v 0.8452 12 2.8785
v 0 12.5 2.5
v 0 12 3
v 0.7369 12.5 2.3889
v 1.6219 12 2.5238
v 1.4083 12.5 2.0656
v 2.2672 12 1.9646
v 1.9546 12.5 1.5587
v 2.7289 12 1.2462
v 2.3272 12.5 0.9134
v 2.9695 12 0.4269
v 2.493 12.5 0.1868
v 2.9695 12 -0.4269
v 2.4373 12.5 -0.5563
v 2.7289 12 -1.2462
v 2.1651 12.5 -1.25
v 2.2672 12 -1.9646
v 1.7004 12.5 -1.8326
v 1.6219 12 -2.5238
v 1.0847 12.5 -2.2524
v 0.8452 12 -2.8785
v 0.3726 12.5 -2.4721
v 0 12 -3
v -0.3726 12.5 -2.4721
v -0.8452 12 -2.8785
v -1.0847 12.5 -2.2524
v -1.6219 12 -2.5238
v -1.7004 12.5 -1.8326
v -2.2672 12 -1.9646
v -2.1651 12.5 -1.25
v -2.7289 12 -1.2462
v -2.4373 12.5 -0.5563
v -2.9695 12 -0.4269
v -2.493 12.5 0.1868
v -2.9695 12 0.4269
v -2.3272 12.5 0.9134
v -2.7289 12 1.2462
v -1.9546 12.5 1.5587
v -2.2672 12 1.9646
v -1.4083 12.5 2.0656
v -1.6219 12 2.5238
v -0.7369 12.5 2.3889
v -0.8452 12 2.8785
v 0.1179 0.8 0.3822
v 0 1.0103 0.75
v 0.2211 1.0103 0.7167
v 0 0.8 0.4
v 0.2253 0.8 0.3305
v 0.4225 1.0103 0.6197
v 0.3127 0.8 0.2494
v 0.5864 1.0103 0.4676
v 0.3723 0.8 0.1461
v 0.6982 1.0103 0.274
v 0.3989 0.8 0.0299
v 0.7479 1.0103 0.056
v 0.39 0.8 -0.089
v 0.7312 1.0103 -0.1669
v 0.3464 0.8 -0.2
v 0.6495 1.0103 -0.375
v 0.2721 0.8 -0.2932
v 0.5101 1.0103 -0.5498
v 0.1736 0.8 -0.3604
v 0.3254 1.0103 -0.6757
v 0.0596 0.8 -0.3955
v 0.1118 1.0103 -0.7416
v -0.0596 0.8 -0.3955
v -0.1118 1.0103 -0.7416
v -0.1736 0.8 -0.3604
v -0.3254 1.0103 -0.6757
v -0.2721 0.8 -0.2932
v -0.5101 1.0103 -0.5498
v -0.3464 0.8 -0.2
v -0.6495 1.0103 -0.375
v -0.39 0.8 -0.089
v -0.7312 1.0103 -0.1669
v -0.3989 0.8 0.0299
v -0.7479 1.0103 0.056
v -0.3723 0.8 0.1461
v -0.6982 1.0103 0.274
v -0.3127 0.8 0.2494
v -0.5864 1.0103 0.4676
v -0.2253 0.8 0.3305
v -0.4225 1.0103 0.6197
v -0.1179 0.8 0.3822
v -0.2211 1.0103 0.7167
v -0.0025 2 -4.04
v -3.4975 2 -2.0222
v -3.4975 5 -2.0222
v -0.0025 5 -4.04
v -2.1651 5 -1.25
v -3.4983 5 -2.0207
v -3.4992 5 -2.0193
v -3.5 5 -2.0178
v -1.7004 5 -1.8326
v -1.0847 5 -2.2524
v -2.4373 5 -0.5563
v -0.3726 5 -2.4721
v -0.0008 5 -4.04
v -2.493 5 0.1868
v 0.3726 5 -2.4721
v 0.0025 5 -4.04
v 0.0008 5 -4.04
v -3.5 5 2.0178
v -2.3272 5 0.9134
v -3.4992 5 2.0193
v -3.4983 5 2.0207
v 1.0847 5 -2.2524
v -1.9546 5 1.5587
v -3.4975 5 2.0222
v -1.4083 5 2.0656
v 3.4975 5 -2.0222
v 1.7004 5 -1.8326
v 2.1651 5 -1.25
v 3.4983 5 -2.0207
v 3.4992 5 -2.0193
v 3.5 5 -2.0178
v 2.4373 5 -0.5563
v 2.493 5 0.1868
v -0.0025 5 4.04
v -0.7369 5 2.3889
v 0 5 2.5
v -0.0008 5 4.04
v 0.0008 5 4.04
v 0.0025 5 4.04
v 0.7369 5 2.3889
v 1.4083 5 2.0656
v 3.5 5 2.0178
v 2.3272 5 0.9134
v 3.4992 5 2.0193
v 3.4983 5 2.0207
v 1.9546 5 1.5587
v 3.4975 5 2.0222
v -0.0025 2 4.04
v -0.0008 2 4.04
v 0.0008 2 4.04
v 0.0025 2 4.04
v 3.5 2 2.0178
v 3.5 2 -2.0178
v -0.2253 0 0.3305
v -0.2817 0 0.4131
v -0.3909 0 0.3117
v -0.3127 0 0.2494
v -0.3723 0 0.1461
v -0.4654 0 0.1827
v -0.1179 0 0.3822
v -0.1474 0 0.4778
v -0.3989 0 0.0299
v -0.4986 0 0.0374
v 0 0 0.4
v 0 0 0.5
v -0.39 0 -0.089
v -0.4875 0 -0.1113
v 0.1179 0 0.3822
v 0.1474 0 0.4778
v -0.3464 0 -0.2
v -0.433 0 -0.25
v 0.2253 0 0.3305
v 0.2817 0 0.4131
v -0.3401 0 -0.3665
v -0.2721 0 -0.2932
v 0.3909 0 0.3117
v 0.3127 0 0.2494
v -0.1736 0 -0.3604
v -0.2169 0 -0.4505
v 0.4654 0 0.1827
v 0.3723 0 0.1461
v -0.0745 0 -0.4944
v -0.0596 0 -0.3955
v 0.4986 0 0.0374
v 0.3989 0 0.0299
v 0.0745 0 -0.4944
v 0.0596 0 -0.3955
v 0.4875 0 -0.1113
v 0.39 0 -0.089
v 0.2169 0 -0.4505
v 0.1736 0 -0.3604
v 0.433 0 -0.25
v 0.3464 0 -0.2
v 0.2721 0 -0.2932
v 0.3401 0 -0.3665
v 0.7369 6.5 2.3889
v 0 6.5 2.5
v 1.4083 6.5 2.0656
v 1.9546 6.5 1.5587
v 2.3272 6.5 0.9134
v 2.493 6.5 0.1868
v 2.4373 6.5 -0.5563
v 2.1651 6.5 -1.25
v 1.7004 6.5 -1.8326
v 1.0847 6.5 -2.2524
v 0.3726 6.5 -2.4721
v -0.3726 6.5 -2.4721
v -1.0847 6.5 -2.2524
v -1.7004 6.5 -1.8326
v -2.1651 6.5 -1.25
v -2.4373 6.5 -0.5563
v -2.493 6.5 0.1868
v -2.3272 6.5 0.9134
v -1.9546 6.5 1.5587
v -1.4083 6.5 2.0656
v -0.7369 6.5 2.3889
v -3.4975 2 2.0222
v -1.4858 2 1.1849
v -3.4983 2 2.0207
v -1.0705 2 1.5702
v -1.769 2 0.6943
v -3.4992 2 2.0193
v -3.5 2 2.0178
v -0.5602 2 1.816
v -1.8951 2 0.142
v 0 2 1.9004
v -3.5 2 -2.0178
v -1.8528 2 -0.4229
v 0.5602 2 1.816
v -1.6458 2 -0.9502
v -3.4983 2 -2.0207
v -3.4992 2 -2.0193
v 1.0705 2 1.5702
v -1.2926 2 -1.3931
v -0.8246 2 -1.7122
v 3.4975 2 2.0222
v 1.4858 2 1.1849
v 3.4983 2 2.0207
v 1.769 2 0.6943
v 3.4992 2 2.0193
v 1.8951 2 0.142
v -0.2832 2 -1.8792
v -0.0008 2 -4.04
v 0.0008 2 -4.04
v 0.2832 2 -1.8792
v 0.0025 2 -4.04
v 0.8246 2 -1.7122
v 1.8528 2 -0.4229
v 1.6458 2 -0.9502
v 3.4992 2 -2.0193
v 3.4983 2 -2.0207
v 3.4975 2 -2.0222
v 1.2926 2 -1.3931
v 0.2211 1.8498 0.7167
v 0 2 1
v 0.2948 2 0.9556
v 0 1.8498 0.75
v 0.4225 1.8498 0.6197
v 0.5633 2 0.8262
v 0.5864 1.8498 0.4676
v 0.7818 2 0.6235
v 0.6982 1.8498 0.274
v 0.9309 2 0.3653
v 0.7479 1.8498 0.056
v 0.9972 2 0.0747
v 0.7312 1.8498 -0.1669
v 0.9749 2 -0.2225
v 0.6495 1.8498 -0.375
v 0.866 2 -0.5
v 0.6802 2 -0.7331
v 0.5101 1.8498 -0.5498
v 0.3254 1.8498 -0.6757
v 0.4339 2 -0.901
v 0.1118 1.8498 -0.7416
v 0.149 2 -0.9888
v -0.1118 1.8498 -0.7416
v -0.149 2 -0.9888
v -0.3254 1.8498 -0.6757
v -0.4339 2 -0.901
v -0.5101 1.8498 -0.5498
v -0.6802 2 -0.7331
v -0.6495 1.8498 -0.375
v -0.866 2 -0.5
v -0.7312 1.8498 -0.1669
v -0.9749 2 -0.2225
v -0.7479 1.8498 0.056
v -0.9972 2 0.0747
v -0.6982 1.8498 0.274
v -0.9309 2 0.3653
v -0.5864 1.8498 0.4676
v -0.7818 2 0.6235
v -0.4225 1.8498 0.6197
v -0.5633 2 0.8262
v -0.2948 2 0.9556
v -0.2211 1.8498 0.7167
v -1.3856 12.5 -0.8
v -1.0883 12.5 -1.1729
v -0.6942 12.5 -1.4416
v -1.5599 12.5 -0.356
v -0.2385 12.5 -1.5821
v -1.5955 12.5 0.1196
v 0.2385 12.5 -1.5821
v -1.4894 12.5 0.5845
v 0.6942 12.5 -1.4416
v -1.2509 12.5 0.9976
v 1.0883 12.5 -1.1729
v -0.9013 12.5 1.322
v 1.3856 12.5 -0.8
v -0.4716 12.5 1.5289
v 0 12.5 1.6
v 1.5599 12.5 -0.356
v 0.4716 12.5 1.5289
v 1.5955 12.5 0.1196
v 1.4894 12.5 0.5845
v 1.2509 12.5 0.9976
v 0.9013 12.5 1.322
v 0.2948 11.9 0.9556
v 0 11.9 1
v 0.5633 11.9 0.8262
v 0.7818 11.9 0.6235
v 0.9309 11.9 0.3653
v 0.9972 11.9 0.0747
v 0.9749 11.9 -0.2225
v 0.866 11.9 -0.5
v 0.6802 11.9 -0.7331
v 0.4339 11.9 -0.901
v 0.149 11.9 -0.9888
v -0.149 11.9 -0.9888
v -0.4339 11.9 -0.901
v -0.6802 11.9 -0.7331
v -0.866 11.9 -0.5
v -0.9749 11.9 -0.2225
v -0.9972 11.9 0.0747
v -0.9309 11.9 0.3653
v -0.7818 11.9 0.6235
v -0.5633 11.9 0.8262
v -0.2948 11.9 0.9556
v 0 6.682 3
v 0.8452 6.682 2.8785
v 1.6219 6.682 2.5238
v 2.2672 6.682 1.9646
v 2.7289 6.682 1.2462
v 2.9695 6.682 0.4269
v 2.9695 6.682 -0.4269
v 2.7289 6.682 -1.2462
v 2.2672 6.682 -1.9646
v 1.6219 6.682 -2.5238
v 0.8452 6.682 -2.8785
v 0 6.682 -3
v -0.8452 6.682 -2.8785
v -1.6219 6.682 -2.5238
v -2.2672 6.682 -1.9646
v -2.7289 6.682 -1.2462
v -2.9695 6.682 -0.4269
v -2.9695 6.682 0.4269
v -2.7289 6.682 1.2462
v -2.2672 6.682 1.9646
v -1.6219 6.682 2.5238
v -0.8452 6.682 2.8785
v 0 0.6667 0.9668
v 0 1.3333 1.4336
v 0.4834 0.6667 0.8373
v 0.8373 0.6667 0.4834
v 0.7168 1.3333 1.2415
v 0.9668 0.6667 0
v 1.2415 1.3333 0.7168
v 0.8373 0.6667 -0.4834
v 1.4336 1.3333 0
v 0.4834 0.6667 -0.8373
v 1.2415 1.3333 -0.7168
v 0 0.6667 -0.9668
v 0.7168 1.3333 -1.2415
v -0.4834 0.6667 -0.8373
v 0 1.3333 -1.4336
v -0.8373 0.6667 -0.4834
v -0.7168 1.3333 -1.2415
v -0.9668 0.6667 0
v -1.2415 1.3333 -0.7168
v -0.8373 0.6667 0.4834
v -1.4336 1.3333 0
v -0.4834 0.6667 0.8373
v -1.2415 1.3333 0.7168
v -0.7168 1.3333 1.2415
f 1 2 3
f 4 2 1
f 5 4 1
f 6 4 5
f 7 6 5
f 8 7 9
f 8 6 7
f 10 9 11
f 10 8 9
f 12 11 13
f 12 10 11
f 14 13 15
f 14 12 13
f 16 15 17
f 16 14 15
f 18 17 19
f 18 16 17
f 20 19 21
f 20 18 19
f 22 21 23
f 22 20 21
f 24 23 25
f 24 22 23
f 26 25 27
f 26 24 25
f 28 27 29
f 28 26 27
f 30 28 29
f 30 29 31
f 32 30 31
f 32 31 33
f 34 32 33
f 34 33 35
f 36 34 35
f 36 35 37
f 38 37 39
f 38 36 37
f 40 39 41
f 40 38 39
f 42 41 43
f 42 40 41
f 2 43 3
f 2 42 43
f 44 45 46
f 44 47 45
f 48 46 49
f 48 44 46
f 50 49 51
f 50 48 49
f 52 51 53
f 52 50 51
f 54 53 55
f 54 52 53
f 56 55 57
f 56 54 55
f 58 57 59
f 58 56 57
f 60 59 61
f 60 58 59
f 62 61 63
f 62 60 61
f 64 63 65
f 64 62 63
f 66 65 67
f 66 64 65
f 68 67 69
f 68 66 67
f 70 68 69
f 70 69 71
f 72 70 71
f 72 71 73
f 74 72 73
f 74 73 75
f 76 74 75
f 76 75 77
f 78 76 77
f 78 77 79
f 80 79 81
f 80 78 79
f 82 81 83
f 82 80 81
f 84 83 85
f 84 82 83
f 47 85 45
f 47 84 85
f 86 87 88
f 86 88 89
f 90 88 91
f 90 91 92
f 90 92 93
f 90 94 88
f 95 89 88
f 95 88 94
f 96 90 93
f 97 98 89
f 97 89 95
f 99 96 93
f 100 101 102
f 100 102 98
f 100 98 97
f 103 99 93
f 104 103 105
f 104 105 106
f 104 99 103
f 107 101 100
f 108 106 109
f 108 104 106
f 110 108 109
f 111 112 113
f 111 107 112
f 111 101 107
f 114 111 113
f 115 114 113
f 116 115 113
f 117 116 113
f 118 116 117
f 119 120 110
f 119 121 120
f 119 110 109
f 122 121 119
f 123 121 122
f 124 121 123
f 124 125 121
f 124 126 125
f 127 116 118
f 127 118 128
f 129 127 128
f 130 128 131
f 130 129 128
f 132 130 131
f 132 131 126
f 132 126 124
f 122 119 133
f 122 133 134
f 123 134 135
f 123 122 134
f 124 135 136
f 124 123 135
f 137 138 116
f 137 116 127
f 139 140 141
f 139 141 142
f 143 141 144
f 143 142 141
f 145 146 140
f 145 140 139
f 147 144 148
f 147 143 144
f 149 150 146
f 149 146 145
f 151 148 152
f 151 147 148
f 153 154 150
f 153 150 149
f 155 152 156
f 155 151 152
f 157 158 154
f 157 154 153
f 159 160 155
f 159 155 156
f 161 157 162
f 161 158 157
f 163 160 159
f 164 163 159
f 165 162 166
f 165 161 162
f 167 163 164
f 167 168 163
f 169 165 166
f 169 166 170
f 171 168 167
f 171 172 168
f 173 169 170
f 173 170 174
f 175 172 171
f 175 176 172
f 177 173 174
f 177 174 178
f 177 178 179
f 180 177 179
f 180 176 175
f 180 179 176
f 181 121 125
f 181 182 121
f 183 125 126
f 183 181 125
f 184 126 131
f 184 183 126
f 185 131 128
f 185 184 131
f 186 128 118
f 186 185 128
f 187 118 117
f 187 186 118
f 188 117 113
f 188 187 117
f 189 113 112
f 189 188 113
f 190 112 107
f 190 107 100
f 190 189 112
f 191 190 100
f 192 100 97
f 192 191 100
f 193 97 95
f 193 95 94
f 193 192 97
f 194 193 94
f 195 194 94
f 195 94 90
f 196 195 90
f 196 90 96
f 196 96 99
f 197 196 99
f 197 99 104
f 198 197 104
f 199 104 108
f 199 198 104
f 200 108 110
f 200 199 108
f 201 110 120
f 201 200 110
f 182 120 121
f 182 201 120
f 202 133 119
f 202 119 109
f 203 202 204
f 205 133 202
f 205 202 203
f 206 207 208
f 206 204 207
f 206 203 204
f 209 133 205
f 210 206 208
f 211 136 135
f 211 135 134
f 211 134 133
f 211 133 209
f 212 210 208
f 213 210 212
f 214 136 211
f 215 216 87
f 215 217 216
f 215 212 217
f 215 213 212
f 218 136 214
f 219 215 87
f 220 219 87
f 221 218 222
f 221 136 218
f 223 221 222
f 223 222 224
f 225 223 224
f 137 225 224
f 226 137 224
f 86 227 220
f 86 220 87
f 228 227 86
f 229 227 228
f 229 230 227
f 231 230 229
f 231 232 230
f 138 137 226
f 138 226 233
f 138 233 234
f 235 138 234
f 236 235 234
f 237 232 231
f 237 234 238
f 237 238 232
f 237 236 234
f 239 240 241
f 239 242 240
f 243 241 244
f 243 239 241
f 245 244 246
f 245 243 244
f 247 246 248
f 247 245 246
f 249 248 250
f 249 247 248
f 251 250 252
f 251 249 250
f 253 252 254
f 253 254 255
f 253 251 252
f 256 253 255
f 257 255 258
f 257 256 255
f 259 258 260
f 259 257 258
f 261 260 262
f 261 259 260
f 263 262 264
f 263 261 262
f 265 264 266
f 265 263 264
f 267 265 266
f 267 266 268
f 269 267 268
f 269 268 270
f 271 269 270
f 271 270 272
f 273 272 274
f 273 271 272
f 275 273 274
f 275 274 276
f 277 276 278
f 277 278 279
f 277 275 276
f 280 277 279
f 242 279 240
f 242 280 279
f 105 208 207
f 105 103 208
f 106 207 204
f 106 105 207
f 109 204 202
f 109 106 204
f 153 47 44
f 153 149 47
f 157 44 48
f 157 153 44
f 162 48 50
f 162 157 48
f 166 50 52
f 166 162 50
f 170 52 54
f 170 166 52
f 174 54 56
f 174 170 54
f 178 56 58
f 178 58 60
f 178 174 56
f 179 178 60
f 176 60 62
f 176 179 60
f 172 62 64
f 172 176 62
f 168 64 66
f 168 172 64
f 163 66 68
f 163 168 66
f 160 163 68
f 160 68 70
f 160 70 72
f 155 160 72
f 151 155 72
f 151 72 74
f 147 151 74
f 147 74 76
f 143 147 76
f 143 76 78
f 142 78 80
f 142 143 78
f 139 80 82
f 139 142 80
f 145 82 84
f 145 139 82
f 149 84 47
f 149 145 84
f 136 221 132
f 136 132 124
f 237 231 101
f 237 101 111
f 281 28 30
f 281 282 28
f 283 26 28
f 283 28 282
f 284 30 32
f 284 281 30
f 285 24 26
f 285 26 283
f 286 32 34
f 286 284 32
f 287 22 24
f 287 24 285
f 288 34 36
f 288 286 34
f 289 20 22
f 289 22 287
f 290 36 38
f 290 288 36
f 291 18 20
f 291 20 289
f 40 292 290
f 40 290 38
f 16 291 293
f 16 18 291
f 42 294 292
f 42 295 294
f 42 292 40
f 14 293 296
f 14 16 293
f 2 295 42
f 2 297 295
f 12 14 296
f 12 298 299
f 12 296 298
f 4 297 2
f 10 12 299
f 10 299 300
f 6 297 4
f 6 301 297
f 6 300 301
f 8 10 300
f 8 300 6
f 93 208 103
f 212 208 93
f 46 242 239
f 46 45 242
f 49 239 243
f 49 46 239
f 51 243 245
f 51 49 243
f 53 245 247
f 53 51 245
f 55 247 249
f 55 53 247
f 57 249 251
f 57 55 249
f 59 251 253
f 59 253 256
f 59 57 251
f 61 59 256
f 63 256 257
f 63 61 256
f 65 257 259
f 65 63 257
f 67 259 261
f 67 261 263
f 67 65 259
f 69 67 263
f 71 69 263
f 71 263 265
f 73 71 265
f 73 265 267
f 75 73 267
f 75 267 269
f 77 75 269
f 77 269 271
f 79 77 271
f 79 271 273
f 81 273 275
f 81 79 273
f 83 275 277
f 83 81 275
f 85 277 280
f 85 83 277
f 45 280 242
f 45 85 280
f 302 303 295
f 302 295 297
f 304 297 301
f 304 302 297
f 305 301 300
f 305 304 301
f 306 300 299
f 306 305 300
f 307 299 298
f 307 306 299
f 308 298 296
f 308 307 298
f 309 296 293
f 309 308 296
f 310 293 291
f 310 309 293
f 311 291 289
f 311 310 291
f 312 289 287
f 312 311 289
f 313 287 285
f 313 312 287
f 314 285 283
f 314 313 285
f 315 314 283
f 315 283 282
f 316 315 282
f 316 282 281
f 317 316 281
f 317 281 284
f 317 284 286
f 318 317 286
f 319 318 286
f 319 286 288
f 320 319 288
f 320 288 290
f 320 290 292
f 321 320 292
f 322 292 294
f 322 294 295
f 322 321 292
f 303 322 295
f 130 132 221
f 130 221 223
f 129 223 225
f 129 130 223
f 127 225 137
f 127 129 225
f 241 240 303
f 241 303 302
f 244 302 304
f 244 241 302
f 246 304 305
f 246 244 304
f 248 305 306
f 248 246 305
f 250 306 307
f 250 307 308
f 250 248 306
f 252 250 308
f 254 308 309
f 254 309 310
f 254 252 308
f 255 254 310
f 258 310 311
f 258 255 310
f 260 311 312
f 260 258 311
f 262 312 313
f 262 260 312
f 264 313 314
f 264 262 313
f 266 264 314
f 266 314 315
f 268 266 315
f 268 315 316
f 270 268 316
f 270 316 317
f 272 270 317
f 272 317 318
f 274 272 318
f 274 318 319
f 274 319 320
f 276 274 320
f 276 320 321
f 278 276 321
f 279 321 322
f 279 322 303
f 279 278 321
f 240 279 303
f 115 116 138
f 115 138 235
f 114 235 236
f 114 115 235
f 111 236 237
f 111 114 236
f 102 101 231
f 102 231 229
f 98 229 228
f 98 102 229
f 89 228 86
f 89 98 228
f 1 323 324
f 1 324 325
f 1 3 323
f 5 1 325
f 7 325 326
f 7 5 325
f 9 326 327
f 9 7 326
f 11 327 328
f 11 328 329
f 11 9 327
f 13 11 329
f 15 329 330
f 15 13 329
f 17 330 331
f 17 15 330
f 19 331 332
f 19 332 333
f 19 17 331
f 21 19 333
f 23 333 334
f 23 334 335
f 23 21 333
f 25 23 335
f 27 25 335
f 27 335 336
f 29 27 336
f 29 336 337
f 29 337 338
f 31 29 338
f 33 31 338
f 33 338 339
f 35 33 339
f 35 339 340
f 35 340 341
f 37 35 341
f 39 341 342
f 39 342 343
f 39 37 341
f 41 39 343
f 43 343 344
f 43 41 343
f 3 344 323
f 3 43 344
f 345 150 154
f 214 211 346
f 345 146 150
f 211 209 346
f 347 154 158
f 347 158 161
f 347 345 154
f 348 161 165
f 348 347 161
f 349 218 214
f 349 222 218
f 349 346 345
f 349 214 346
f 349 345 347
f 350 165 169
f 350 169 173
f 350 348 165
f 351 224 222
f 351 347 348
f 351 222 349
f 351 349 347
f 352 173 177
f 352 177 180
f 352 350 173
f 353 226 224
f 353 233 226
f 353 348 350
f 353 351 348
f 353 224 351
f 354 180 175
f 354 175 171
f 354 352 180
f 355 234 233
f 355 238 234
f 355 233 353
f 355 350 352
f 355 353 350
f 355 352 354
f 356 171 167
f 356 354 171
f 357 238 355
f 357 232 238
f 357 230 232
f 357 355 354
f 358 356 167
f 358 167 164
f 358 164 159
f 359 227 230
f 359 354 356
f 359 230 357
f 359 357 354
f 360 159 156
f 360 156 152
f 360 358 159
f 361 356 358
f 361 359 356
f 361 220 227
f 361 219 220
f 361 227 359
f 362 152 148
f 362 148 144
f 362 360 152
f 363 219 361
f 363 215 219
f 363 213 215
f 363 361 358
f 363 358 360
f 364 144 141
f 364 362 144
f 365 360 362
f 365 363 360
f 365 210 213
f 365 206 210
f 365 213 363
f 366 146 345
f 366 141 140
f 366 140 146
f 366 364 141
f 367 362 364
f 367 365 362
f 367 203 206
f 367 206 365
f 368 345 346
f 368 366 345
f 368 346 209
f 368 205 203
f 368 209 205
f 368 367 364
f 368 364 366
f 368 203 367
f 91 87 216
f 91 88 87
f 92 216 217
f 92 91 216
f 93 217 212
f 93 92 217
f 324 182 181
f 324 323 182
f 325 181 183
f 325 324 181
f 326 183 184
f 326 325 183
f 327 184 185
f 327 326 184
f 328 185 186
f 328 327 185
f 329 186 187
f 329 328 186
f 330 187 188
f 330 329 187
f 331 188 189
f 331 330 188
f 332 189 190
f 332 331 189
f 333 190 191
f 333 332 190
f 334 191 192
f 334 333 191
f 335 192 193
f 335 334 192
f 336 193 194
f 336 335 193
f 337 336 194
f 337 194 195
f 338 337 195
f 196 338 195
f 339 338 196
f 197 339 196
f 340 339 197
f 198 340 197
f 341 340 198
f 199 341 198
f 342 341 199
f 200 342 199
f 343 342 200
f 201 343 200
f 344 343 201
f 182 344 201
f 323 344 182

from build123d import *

# Parameters (mm, degrees)
SKETCH_2_OUTSIDE_W  = 13.468
SKETCH_2_OUTSIDE_H  = 13.468
CUT_EXTRUDE_1_DEPTH = 3
CHAMFER_1_SIZE      = 0.6


with BuildPart() as part:
    # Эскиз1 → Повернуть1 (revolve)
    with BuildSketch(Plane(origin=(0, 0, 0), x_dir=(0, 0, -1), z_dir=(1, 0, 0))):
        Polygon((-0.4, 0.8), (-0.4, 0), (-0.5, 0), (-1.900415076, 2), (-4.04, 2), (-4.04, 5), (-2.5, 5), (-2.5, 6.5), (-3, 6.681985117), (-3, 12), (-2.5, 12.5), (-1, 12.5), (-1, 2), (-0.75, 1.849784845), (-0.75, 1.010301217), align=None)
    revolve(axis=Axis((0, 0, 0), (0, 1, 0)))

    # Эскиз2 outside → Вырез-Вытянуть1 (cut)
    with BuildSketch(Plane.XZ.offset(-2)):
        Rectangle(SKETCH_2_OUTSIDE_W, SKETCH_2_OUTSIDE_H)
        Polygon((0, 4.041451884), (-3.5, 2.020725942), (-3.5, -2.020725942), (0, -4.041451884), (3.5, -2.020725942), (3.5, 2.020725942), align=None, mode=Mode.SUBTRACT)
    extrude(amount=-CUT_EXTRUDE_1_DEPTH, mode=Mode.SUBTRACT)

    # Фаска1
    chamfer_1_edges = [part.edges().sort_by_distance(p)[0] for p in [
        (0, 12.5, -1),
    ]]
    chamfer(chamfer_1_edges, length=CHAMFER_1_SIZE)


solid = part.part
